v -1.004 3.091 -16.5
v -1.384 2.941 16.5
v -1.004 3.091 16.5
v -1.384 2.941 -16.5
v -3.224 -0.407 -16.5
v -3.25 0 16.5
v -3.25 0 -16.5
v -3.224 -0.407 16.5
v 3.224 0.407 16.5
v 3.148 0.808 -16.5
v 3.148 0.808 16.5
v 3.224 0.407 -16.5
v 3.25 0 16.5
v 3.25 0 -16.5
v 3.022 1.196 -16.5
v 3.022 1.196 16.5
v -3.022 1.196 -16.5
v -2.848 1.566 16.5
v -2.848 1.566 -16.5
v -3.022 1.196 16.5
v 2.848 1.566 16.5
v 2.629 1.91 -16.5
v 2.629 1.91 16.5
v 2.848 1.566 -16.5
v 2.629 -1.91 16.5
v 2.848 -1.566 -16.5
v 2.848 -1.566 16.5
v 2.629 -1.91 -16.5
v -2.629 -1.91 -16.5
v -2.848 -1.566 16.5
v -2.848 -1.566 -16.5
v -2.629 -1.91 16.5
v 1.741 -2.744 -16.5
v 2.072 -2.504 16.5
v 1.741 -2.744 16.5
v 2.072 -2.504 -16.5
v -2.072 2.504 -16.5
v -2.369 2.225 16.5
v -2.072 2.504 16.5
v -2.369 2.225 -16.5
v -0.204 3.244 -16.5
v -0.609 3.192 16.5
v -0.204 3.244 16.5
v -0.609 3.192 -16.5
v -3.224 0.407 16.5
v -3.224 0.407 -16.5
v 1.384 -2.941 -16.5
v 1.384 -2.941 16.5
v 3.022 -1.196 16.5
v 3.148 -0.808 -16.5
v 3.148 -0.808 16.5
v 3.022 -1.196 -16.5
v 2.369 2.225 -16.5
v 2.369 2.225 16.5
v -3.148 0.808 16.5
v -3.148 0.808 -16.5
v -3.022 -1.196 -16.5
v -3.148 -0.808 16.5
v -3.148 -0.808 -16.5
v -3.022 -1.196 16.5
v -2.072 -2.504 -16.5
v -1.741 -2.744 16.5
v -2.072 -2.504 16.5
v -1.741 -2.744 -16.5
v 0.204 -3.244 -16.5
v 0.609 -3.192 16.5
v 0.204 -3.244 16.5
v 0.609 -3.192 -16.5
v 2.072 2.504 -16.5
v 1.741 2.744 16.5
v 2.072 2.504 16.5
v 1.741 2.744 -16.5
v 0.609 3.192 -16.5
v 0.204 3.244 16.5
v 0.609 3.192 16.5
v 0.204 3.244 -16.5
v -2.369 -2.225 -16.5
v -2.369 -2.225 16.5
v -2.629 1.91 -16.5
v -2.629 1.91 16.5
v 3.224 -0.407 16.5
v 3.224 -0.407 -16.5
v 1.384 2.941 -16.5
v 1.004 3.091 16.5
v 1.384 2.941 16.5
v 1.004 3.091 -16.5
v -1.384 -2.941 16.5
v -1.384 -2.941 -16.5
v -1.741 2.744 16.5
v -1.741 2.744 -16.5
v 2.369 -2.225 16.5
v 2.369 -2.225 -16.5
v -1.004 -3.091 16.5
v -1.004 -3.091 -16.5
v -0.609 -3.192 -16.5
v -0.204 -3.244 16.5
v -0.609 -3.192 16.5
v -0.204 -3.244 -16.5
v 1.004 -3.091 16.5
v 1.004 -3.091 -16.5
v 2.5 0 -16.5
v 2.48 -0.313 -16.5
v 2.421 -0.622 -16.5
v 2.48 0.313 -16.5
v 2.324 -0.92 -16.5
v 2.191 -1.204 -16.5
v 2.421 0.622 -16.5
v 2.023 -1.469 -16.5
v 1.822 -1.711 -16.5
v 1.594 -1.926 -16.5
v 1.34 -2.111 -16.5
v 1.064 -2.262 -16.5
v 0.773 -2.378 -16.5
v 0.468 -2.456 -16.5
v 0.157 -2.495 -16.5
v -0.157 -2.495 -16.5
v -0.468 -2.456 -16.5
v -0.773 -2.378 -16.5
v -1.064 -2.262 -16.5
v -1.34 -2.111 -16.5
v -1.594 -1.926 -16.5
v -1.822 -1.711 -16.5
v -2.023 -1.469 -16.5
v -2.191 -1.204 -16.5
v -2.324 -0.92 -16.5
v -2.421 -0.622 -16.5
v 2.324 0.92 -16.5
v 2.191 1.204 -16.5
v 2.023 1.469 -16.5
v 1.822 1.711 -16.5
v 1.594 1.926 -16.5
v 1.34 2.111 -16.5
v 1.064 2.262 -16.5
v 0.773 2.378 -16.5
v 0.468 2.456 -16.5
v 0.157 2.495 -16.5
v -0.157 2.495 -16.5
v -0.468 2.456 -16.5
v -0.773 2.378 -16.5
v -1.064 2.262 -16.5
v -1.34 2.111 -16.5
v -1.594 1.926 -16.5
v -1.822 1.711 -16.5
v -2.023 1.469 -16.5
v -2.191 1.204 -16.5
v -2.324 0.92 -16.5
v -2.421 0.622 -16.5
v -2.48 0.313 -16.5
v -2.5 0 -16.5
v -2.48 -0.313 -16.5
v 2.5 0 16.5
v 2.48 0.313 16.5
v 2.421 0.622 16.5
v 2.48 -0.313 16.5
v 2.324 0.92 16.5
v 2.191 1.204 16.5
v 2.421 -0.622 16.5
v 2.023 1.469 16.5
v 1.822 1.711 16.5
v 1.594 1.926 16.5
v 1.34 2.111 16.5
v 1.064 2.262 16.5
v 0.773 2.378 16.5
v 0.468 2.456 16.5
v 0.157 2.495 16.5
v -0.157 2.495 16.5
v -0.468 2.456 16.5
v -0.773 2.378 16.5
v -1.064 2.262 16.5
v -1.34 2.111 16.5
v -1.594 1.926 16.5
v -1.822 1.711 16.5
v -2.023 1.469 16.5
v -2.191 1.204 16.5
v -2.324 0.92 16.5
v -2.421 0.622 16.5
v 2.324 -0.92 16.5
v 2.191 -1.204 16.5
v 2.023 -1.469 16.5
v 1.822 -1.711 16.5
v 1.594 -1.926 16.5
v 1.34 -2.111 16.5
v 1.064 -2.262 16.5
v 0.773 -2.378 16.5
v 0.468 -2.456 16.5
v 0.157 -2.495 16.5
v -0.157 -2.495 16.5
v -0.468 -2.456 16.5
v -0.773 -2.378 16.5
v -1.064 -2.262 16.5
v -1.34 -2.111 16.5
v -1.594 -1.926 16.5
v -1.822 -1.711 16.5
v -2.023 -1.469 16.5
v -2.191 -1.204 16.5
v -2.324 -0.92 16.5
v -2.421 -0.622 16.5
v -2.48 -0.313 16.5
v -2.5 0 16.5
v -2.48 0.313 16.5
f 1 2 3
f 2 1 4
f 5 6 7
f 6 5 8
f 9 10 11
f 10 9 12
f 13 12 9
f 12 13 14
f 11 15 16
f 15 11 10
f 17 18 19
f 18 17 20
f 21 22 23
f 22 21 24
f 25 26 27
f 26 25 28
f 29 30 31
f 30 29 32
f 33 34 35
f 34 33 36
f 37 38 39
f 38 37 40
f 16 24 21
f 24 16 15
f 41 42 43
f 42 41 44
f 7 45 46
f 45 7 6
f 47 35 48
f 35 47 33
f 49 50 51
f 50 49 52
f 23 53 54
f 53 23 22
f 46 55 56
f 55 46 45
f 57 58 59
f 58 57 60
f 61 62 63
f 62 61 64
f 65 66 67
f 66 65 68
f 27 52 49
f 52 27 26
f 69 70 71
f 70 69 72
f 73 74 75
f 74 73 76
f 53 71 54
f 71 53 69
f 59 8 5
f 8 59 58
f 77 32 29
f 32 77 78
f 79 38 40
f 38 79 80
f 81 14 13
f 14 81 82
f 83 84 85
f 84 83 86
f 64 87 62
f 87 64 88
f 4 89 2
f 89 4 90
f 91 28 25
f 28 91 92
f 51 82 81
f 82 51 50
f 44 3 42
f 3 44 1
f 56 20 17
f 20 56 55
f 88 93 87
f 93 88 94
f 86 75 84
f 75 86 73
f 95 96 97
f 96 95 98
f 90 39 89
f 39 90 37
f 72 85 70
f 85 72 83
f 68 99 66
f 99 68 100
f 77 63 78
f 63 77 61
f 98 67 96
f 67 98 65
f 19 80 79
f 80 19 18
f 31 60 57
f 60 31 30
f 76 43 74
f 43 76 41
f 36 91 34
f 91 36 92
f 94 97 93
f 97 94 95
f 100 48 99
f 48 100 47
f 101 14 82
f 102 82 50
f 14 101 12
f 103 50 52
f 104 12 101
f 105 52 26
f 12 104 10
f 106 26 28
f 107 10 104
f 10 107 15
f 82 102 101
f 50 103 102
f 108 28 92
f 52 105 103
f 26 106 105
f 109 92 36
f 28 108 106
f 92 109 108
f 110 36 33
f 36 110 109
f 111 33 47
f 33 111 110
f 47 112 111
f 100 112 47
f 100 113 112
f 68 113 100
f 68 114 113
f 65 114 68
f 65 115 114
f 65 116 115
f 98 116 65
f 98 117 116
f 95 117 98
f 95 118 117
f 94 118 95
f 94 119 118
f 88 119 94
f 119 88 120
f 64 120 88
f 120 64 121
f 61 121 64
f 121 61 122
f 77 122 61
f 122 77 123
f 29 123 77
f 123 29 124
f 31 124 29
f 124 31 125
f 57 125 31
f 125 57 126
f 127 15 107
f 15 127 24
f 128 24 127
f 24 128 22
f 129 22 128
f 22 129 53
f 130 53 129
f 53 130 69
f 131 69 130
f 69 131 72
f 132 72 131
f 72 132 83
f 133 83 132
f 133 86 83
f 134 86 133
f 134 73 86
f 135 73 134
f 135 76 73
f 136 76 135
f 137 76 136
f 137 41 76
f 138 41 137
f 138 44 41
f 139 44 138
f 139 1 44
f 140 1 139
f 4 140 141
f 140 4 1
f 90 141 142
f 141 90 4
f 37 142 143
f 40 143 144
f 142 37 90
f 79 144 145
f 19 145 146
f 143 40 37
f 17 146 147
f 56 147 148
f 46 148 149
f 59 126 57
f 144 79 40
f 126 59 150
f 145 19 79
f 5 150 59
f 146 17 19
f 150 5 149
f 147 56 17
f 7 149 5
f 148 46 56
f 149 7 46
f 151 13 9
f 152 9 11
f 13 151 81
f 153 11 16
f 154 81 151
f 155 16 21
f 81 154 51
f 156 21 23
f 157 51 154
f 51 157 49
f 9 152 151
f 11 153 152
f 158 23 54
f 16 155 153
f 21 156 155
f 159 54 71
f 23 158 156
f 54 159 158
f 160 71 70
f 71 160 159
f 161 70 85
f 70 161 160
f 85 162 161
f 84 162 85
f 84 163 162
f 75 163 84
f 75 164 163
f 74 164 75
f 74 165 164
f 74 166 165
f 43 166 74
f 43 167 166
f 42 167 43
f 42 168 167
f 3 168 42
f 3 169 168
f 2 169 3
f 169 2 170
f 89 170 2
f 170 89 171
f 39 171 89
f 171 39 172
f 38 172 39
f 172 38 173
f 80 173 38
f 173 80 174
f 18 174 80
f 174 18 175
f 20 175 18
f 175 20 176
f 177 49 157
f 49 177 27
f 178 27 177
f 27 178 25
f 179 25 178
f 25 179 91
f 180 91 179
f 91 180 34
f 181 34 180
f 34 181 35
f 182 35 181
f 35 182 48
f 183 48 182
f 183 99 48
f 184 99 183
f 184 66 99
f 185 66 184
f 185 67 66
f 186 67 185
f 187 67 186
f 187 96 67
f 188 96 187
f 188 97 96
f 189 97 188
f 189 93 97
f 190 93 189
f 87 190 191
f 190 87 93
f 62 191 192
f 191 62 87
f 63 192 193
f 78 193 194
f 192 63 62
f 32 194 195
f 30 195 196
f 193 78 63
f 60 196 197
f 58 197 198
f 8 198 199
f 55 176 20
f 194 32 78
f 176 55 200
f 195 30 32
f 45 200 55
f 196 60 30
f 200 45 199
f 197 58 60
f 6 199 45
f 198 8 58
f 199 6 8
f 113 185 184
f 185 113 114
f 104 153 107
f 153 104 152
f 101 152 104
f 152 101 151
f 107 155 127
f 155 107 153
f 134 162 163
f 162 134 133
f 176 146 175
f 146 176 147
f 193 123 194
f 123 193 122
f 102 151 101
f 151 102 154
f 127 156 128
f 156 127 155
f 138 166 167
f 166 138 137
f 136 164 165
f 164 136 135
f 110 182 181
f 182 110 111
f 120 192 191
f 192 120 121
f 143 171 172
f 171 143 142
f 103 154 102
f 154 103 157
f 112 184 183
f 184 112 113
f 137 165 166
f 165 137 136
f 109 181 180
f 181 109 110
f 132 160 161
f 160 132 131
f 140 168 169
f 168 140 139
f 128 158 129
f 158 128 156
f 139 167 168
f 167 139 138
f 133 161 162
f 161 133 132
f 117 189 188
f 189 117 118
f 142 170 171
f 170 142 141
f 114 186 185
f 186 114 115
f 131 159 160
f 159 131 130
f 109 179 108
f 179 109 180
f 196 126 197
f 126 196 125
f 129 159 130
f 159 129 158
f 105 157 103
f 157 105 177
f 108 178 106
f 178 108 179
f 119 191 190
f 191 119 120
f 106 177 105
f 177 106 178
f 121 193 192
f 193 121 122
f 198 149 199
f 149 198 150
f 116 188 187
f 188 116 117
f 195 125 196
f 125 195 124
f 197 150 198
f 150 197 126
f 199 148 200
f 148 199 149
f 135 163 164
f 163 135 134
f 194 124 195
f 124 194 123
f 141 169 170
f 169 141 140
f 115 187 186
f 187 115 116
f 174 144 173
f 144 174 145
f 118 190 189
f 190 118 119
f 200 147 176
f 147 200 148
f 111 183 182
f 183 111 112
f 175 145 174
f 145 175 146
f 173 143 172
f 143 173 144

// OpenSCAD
$fn = 50;


difference() {
	union() {
		translate(v = [0, 0, -16.5000000000]) {
			cylinder(h = 33, r = 3.2500000000);
		}
	}
	union() {
		translate(v = [0, 0, -100.0000000000]) {
			cylinder(h = 200, r = 2.5000000000);
		}
	}
}
